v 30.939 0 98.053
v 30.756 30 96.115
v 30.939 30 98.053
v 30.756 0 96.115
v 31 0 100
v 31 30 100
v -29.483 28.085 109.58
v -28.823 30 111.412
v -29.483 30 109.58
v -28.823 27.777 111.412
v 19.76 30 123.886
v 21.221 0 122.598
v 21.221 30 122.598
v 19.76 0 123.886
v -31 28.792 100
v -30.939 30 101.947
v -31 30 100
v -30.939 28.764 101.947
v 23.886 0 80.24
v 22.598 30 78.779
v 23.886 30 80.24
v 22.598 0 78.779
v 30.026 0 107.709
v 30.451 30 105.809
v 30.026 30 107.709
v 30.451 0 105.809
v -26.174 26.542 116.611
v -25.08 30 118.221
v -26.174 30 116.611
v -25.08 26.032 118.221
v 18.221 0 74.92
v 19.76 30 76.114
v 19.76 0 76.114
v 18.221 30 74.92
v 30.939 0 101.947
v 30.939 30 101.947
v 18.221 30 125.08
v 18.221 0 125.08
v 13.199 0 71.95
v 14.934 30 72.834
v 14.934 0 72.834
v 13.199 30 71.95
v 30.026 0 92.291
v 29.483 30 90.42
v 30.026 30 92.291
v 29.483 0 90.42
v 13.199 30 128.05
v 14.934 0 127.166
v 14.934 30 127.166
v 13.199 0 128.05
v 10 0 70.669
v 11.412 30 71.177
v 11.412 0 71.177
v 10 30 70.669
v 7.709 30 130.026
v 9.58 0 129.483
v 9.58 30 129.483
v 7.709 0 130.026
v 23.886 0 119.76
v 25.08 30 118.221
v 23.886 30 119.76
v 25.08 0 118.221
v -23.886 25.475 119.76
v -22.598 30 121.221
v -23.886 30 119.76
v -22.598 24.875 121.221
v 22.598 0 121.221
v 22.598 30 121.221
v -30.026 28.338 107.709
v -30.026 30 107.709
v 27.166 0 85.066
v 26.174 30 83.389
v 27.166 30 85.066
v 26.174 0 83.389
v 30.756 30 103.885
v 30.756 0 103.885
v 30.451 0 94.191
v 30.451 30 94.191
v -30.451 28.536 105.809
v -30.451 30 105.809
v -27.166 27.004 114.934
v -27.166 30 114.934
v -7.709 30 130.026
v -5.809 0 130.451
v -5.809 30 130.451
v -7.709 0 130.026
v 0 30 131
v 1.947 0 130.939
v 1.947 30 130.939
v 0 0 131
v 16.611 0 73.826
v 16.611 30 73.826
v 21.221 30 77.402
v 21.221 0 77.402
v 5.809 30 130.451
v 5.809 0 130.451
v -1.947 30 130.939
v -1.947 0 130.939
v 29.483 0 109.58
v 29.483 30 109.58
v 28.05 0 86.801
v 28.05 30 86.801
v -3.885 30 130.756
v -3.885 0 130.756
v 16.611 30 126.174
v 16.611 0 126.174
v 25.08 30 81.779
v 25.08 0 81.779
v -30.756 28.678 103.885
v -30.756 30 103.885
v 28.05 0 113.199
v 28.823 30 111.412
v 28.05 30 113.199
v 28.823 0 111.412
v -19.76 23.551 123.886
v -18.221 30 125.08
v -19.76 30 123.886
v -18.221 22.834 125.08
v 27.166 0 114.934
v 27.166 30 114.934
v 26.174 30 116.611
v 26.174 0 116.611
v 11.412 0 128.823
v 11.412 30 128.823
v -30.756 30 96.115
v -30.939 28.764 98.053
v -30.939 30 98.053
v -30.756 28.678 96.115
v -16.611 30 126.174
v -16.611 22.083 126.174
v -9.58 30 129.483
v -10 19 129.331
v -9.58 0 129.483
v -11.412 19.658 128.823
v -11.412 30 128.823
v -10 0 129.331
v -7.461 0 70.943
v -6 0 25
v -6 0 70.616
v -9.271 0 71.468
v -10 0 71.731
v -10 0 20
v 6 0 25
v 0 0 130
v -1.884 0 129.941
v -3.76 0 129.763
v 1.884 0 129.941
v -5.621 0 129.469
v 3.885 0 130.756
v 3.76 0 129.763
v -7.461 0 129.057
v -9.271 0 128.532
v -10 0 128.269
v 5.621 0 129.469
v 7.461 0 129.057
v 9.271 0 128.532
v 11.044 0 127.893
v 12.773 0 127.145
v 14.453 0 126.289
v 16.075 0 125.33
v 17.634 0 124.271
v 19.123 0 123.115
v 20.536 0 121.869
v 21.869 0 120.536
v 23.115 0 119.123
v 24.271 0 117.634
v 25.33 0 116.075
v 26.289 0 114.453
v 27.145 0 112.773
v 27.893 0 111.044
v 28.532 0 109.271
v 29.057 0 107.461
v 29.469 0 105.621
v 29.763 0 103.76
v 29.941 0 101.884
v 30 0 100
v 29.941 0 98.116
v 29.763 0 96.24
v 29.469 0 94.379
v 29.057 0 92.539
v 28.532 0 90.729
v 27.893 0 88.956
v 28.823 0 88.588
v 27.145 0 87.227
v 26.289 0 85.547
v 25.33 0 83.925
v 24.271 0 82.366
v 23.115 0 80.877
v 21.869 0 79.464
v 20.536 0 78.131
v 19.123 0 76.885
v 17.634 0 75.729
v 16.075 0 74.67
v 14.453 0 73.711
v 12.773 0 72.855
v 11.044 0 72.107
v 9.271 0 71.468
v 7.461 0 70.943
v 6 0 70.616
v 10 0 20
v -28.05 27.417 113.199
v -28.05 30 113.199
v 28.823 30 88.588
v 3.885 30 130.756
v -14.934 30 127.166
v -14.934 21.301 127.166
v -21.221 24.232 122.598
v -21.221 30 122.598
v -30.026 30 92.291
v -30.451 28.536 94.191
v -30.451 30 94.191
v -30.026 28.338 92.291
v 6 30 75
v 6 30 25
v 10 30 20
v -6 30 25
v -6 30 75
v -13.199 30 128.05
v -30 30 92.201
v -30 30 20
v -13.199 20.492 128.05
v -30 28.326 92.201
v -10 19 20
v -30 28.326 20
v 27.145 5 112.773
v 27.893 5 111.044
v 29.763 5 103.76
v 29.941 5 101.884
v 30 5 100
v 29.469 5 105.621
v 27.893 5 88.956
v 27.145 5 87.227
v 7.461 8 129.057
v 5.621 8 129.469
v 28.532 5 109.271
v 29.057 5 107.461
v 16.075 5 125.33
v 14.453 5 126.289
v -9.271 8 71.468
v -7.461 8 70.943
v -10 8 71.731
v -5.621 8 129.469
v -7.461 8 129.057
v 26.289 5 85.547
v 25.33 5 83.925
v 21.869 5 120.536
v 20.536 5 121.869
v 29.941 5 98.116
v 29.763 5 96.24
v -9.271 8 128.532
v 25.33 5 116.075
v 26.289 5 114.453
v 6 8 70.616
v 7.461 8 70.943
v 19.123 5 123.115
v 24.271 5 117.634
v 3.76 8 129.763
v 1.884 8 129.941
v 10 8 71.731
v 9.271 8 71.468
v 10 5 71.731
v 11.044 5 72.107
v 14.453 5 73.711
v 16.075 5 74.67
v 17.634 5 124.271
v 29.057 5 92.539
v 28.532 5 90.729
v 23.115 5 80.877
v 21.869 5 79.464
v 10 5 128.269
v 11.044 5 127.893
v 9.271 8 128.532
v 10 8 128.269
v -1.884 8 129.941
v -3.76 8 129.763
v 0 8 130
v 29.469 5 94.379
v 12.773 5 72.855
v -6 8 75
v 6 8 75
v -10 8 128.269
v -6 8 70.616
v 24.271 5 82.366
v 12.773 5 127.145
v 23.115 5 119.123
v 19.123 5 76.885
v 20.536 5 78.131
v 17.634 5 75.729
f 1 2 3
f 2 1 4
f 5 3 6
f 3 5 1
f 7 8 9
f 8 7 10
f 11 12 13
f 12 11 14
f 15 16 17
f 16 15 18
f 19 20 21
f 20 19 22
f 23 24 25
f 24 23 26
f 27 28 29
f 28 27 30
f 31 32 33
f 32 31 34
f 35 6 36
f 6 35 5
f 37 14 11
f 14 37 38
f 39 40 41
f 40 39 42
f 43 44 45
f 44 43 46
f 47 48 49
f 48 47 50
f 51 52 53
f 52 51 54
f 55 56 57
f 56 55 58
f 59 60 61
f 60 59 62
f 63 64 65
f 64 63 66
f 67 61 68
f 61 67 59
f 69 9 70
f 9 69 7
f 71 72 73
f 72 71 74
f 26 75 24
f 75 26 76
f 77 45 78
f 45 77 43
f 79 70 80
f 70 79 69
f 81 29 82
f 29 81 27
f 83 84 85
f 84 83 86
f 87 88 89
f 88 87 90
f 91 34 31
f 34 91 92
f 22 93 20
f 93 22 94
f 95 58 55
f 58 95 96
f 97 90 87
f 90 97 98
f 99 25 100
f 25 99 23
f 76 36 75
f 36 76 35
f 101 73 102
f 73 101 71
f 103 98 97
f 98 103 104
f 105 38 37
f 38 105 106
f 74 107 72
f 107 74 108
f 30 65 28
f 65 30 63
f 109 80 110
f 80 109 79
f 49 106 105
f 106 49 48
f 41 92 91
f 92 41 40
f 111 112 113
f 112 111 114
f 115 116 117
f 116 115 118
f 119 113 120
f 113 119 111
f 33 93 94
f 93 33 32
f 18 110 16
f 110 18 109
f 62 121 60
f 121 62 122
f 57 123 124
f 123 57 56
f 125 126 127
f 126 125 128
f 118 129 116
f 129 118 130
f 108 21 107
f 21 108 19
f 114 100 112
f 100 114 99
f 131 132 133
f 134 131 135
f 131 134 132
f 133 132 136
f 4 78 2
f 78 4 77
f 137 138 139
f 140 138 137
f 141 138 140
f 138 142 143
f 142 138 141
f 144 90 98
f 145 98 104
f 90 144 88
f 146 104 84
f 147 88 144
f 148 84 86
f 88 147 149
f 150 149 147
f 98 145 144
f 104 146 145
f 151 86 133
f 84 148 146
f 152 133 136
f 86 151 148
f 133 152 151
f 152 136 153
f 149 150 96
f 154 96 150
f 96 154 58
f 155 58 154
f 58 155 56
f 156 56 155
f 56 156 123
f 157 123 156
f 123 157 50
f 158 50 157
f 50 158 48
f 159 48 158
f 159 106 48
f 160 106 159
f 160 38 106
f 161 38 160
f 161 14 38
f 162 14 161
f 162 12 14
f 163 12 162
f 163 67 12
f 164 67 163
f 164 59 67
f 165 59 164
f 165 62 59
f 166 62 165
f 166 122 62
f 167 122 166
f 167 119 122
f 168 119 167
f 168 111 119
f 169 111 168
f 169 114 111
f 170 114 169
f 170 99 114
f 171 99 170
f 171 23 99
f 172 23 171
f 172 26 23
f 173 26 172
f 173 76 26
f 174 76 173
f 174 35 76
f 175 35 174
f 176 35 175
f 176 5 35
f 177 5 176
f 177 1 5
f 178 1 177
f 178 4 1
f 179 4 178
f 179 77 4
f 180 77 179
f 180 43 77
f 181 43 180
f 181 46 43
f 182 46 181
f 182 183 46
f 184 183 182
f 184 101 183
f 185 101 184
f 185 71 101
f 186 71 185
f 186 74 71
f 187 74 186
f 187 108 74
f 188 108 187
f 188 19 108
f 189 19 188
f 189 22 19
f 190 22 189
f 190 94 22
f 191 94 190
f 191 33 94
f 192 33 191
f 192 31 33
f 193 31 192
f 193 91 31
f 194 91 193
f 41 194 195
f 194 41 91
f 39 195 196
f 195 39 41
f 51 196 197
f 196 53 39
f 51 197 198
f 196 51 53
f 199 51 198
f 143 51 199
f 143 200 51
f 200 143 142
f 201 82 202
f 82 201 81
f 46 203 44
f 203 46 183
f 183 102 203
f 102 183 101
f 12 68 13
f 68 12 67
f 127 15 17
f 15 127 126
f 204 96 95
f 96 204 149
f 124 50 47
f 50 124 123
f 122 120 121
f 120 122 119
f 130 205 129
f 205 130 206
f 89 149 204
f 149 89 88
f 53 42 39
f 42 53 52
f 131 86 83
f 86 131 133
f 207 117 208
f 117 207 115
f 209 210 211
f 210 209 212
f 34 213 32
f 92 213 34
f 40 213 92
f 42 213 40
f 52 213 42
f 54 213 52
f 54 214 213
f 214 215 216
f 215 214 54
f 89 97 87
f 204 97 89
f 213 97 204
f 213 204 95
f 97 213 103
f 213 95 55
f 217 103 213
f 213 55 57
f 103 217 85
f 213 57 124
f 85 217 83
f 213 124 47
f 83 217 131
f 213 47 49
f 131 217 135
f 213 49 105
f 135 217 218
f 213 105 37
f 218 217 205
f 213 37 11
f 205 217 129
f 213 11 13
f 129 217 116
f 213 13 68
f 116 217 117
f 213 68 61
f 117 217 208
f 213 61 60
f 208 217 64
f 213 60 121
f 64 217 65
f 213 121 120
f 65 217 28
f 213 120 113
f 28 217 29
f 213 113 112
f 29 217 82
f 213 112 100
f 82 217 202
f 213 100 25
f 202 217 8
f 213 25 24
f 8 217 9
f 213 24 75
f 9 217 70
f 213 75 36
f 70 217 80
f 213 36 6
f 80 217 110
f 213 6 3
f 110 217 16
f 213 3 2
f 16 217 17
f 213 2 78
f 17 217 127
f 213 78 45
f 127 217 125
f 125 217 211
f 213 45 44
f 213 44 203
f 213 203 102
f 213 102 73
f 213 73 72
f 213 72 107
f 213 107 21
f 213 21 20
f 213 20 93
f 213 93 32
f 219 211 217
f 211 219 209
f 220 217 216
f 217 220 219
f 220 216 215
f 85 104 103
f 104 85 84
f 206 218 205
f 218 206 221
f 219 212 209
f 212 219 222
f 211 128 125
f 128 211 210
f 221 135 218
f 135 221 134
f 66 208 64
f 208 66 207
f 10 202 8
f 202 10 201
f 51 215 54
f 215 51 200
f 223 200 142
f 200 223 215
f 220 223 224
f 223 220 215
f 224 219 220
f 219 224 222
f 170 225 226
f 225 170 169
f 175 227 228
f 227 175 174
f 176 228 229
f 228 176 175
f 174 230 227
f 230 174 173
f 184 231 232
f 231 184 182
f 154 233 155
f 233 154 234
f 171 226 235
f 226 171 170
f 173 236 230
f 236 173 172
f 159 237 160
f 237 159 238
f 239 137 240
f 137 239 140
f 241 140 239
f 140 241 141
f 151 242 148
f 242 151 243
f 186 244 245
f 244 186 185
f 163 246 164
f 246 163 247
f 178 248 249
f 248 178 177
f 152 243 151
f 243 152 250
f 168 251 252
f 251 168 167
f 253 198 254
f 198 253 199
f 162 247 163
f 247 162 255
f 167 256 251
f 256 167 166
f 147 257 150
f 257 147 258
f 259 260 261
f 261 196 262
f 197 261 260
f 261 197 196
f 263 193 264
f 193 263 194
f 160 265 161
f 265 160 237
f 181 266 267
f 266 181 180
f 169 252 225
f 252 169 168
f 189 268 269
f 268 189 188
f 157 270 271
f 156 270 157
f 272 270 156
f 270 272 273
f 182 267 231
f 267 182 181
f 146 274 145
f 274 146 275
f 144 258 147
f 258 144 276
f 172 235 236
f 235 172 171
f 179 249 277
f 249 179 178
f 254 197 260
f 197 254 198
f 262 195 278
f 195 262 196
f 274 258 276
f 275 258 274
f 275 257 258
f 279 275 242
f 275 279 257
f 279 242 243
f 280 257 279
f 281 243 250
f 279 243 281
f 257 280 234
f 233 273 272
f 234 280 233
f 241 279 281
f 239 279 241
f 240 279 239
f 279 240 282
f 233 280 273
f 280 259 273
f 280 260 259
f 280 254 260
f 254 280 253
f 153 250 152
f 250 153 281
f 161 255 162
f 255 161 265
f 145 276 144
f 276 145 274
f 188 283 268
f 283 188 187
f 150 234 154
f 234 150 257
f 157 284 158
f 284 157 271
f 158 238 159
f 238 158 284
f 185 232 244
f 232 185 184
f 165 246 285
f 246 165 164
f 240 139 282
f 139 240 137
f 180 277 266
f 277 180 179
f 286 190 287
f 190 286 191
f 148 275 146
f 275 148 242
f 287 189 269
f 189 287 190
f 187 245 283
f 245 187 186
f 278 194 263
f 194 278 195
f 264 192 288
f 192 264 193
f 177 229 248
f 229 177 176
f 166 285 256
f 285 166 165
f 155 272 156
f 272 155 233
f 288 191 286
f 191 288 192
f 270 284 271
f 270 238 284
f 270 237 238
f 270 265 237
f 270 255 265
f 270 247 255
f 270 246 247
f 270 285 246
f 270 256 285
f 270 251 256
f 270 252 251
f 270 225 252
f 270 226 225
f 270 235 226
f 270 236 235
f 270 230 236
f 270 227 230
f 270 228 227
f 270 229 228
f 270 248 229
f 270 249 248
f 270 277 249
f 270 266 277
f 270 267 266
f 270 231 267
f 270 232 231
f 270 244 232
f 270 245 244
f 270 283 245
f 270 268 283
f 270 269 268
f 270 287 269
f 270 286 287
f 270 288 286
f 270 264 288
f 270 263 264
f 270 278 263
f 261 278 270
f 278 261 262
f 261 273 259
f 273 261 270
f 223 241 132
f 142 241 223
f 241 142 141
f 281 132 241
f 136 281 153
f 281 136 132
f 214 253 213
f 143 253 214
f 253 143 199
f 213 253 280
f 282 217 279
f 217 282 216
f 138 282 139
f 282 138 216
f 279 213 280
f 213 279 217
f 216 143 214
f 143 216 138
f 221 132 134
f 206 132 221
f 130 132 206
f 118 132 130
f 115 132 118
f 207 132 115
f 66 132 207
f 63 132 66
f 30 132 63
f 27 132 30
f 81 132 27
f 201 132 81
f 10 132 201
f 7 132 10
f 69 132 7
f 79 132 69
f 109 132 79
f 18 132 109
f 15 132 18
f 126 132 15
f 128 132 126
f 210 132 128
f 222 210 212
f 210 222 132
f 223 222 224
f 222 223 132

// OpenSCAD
//magsafe(0,-1,100);

difference()
{
    union()
    {
        translate([0,0,100]) rotate([-90,0,0]) cylinder(h=30,r=62/2,$fn=100);
        translate([-30,0,20]) cube([40,30,80]);
    }
    magsafe(0,-1,100);
    translate([-60,-1,0]) cube([50,20,150]);
    translate([-60+50,-1+20,0]) rotate ([0,0,180-25]) cube([50,30,150]);
}



module magsafe(X,Y,Z)
{
    color("LightGrey")
    translate([X,Y+9,Z])
    rotate([90,0,0])
    {
        difference()
        {
            cylinder(h=9,r=60/2,$fn=100);
            translate([10,-70/2,-5+3]) cube([25,70,5]);
            translate([-25-10,-70/2,-5+3]) cube([25,70,5]);
        }
        translate([-12/2,-60/2-45,9/2+4-50]) cube([12,50,50]);
    }
}
